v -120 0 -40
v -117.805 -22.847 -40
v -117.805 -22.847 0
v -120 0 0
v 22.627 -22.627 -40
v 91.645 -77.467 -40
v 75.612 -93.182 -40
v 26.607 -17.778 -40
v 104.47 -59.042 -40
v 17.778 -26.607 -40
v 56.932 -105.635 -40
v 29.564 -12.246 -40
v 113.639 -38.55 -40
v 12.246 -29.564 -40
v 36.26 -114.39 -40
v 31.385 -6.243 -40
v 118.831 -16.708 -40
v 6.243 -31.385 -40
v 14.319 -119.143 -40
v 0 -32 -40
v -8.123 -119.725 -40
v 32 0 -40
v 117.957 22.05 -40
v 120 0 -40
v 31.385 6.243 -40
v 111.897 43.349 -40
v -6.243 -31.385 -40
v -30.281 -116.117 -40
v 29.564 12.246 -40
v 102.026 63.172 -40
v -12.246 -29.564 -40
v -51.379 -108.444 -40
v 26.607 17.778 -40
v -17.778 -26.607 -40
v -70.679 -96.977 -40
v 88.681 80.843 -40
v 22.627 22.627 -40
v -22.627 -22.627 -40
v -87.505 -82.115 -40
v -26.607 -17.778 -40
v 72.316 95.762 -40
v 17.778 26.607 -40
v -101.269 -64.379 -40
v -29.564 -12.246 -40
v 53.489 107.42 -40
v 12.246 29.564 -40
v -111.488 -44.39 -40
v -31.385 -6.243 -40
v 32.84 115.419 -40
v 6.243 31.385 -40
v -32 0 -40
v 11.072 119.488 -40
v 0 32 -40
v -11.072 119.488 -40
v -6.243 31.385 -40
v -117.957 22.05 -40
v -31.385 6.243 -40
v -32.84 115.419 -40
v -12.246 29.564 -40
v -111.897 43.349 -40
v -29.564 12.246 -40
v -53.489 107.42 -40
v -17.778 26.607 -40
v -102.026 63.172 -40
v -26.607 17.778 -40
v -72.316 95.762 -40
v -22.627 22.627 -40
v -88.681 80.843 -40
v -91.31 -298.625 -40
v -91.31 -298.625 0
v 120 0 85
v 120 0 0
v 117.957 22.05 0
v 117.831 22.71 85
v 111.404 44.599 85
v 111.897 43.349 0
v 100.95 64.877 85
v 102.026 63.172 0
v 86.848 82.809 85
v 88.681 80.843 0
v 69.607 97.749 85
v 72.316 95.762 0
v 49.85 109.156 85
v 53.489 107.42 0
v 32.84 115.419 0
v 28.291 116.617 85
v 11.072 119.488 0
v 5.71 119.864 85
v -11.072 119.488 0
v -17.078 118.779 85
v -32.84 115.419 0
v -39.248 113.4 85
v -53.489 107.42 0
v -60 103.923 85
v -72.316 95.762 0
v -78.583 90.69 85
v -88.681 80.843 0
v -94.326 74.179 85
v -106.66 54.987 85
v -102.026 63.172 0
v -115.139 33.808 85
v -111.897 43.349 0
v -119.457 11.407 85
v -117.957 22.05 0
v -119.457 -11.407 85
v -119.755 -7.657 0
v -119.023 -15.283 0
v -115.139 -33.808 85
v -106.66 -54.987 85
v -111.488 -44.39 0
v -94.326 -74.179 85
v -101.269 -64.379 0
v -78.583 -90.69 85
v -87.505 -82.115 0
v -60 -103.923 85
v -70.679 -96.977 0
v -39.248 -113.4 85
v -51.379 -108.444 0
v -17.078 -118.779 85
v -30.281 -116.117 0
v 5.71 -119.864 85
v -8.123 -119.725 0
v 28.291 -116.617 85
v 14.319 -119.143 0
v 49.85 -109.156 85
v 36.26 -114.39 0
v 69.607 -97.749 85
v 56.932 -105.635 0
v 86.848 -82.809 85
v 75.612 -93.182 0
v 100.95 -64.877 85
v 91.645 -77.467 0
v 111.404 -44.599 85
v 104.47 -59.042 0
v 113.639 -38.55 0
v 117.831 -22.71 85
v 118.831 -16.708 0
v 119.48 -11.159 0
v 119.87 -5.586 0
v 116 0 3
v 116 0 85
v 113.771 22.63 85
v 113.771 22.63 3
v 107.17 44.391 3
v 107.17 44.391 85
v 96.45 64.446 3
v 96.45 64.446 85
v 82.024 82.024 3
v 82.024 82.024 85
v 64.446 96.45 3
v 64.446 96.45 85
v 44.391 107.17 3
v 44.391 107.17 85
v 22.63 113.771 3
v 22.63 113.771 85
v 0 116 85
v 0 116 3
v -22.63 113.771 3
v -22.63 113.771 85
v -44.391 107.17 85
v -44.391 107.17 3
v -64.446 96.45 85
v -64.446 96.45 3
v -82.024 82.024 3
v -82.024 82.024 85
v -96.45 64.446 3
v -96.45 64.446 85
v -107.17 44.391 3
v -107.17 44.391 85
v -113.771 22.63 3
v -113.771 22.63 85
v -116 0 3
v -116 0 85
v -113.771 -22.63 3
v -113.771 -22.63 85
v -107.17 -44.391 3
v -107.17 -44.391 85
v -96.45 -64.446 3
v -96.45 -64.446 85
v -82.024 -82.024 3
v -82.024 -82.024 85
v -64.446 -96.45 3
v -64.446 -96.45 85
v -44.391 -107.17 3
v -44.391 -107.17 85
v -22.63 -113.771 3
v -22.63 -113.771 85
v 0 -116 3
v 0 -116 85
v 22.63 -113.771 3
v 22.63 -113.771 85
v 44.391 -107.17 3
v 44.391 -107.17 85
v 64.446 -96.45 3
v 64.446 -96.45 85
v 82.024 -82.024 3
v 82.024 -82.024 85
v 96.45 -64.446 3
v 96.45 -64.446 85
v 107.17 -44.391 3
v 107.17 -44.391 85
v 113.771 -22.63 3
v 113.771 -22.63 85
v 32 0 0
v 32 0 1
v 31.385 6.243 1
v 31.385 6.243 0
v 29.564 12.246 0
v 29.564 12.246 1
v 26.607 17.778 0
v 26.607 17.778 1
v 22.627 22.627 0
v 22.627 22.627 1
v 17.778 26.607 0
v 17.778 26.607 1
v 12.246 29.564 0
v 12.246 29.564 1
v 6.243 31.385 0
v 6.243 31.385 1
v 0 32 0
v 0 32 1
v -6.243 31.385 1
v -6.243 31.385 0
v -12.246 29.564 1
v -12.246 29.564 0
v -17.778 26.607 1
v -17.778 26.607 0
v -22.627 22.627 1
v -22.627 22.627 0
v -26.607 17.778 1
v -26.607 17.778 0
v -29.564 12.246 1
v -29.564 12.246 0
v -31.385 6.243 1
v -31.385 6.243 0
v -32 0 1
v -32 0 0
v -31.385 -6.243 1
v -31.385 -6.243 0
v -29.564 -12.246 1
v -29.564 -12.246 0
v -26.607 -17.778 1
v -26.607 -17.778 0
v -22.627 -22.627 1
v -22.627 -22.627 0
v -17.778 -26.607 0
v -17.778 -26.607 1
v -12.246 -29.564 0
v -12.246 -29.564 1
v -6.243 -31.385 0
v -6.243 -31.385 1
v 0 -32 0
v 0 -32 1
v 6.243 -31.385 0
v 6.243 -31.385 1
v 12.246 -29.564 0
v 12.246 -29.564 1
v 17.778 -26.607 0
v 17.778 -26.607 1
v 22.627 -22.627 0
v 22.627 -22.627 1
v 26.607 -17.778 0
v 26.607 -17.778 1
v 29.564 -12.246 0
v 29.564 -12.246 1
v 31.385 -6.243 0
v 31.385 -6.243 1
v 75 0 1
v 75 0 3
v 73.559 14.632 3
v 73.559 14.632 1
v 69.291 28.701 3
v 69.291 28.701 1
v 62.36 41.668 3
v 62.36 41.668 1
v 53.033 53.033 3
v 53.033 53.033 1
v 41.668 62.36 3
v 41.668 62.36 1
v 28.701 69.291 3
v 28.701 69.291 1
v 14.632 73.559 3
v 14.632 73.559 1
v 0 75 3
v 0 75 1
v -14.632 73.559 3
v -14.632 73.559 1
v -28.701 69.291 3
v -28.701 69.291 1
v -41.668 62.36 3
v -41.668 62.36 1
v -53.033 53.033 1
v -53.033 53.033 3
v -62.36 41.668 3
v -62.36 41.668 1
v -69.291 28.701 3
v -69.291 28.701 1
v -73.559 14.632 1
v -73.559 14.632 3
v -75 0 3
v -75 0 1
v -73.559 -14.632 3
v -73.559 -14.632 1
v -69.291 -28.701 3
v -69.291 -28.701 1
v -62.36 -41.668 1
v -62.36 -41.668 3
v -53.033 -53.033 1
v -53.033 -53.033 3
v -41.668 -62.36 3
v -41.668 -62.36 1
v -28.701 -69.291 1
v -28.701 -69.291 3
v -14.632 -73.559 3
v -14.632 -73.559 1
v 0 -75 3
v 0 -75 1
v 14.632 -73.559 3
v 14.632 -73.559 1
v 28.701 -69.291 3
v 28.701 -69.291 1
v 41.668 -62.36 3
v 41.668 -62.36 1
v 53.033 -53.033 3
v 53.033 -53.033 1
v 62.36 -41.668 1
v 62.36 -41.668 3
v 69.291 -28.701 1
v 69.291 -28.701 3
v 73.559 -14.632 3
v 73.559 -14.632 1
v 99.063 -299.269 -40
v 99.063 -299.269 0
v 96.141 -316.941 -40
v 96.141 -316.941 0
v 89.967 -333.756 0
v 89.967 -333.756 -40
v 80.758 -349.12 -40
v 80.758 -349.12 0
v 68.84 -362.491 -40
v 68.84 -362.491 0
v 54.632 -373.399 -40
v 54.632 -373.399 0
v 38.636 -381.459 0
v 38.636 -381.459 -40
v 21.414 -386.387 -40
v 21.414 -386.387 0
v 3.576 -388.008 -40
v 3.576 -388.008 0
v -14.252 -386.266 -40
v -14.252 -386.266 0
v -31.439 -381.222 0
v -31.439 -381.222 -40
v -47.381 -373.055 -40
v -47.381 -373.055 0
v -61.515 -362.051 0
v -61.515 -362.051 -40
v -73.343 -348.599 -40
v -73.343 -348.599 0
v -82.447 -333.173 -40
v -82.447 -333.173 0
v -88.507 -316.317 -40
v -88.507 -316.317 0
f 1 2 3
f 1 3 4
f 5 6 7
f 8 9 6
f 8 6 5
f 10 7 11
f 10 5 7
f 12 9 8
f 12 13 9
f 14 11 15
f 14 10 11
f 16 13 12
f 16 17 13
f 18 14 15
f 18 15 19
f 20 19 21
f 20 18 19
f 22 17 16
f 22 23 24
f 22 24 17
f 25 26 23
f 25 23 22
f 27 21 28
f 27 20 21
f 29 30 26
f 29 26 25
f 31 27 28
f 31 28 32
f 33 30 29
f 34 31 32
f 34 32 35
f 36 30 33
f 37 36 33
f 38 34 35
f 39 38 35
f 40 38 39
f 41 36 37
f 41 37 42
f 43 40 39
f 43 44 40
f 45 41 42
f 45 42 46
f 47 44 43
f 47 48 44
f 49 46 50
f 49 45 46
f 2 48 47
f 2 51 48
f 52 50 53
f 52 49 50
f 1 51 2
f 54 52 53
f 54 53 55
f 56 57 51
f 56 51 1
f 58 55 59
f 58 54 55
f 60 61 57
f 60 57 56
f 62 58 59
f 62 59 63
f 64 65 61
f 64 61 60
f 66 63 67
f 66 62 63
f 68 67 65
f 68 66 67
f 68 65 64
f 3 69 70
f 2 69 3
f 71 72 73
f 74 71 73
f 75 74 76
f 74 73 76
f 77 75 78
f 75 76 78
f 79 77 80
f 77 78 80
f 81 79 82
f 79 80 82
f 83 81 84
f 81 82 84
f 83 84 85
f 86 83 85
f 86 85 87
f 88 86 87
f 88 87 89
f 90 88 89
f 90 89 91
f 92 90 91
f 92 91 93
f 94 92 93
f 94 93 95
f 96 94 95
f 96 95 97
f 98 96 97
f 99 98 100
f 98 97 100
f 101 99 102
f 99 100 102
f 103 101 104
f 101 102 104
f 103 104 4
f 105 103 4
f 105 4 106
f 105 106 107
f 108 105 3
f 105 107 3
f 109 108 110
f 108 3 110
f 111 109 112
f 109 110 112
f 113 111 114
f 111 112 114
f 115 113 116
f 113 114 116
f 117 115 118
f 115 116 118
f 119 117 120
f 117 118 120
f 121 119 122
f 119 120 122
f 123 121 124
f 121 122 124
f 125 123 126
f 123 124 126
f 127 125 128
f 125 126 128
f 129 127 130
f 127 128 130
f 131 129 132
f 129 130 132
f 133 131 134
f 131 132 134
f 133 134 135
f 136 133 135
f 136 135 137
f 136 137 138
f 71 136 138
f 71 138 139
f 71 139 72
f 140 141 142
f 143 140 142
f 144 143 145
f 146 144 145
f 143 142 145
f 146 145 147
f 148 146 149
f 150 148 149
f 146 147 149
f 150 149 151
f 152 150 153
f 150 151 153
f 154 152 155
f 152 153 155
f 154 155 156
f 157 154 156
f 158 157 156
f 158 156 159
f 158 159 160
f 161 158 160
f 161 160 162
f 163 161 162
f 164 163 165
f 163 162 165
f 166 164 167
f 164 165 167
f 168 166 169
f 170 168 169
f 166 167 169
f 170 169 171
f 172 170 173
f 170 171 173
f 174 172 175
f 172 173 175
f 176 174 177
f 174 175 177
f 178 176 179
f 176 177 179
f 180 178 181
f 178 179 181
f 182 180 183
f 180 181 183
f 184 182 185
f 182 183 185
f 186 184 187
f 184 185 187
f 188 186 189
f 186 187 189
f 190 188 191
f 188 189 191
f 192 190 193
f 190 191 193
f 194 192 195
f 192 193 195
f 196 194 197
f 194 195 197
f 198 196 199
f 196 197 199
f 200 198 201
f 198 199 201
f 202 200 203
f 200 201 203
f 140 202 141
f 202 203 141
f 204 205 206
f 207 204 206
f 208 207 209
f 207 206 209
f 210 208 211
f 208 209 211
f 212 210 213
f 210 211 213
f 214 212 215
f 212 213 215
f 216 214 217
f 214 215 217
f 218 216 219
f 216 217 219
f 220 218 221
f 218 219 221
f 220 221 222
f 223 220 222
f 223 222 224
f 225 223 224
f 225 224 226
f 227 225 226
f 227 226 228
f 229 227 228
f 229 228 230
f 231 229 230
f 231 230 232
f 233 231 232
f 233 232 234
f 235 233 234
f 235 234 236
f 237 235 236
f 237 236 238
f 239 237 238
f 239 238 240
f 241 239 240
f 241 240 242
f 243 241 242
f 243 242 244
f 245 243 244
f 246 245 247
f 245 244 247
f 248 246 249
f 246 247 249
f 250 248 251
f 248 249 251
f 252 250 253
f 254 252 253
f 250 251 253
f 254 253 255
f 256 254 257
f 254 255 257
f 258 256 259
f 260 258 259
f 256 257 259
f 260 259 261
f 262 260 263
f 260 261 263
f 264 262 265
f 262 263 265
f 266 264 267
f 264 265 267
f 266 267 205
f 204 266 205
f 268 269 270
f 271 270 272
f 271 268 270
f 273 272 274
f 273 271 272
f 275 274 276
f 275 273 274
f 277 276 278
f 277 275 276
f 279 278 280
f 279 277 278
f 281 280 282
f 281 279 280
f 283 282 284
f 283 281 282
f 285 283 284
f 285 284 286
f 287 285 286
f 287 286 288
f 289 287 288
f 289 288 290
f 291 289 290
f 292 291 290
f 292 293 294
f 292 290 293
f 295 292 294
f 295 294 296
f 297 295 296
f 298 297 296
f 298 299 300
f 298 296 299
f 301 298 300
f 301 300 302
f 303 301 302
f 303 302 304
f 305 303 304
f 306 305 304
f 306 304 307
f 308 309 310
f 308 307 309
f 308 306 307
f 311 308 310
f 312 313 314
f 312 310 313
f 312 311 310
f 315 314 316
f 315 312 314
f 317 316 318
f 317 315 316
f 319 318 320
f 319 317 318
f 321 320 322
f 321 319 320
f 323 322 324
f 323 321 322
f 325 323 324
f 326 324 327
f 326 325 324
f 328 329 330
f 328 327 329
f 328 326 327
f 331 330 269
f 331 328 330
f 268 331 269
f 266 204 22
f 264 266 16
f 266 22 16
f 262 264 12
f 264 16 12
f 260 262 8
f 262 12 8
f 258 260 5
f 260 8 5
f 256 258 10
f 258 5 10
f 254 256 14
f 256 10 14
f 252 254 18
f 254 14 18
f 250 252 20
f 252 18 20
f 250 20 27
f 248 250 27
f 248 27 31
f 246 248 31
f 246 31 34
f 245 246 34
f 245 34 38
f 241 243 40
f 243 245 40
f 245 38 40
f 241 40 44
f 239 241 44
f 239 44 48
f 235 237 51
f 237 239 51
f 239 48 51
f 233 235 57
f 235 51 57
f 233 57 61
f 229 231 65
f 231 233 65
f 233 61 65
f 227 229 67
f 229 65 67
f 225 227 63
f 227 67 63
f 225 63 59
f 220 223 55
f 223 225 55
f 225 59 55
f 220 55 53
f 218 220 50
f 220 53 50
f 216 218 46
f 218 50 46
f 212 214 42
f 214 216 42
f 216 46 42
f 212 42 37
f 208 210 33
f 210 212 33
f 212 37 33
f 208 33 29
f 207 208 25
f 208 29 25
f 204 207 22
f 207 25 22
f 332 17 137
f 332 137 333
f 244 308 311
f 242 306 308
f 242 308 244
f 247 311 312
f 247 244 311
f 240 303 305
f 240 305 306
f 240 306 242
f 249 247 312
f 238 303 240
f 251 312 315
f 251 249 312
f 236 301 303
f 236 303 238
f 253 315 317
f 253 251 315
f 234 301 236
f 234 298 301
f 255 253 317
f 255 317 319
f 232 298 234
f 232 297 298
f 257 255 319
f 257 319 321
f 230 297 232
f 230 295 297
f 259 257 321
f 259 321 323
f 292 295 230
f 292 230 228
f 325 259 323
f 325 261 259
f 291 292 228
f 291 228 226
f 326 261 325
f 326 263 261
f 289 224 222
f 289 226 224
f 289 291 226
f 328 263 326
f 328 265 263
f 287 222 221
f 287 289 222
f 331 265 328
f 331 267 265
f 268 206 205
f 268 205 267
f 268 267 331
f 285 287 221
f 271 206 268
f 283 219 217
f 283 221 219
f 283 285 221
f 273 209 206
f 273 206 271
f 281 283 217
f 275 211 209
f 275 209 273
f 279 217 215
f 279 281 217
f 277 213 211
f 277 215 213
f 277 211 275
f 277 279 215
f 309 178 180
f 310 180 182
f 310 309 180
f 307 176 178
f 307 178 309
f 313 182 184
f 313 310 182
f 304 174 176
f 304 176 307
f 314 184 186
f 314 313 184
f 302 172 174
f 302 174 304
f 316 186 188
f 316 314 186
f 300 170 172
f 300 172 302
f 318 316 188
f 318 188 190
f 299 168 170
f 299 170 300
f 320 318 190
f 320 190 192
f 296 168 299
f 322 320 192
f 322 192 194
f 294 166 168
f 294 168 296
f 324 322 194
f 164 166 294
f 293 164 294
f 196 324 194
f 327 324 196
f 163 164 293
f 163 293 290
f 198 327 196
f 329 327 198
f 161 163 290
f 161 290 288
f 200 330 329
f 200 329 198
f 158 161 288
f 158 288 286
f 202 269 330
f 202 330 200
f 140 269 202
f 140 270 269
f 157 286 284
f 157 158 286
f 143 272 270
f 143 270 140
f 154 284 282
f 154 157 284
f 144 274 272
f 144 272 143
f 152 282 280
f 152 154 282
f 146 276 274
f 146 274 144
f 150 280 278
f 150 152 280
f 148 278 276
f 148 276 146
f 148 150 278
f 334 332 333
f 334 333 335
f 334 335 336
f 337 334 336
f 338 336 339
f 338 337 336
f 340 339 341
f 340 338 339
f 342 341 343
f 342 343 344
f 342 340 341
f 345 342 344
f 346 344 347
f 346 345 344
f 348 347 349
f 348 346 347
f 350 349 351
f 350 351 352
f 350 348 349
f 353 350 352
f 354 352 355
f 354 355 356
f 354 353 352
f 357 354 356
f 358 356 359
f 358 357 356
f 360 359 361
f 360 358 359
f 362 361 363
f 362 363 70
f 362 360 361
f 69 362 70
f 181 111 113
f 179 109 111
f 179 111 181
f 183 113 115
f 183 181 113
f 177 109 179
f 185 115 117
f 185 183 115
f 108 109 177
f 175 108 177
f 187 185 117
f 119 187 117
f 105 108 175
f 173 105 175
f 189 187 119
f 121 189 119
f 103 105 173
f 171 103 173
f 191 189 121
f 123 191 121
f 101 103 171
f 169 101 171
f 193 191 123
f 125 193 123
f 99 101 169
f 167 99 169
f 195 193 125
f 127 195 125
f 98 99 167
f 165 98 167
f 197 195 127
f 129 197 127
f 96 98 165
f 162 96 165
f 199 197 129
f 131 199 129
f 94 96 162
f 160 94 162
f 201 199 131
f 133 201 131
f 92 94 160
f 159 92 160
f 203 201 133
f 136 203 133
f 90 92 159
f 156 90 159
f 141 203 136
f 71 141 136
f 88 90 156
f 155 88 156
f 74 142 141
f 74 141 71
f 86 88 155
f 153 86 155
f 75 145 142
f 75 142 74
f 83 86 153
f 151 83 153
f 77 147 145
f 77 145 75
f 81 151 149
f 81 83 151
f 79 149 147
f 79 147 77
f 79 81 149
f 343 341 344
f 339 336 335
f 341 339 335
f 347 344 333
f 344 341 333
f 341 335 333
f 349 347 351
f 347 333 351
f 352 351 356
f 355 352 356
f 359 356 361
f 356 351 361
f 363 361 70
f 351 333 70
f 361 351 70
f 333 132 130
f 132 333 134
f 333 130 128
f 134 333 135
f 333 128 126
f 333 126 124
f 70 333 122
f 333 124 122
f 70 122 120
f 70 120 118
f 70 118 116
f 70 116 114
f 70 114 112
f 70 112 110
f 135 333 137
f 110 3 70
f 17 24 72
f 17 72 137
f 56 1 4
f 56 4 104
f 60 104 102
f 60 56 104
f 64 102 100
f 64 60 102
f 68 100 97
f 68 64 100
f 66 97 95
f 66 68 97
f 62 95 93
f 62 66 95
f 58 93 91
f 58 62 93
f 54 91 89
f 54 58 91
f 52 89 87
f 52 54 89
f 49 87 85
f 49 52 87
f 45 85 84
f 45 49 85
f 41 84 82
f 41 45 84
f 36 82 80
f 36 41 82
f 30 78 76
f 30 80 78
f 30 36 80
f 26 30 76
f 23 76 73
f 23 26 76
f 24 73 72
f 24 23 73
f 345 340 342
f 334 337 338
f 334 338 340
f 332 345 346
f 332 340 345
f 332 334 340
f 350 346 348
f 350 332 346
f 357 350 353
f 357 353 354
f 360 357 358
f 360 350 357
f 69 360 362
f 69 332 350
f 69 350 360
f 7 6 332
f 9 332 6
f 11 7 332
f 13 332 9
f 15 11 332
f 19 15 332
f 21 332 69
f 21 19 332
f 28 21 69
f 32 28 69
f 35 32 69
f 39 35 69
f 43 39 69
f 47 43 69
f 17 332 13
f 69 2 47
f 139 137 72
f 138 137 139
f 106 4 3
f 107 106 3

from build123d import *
from build123d.topology import SkipClean

# Parameters (mm, degrees)
SKETCH2_R               = 120
BOSS_EXTRUDE2_DEPTH     = 85
SKETCH3_R               = 116
CUT_EXTRUDE1_DEPTH      = 82
CUT_EXTRUDE5_DEPTH      = 2
CUT_EXTRUDE5_DEPTH_BACK = 2
SKETCH8_R               = 75
SKETCH9_R               = 32
CUT_EXTRUDE6_DEPTH      = 5
BOSS_EXTRUDE4_START     = 40
SKETCH12_R              = 32
BOSS_EXTRUDE4_DEPTH     = 40


with BuildPart() as part:
    # Sketch2 → Boss-Extrude2 (new body)
    with BuildSketch(Plane.XY):
        Circle(SKETCH2_R)
    extrude(amount=BOSS_EXTRUDE2_DEPTH)

    # Sketch3 → Cut-Extrude1 (cut)
    with BuildSketch(Plane.XY.offset(85)):
        Circle(SKETCH3_R)
    extrude(amount=-CUT_EXTRUDE1_DEPTH, mode=Mode.SUBTRACT)

    # Sketch8 → Cut-Extrude5 (cut, two sides: drawn at the far end of the back side and taken through both)
    with BuildSketch(Plane.XY.offset(3).offset(-CUT_EXTRUDE5_DEPTH_BACK)):
        Circle(SKETCH8_R)
    extrude(amount=CUT_EXTRUDE5_DEPTH + CUT_EXTRUDE5_DEPTH_BACK, mode=Mode.SUBTRACT)

    # Sketch9 → Cut-Extrude6 (cut)
    with BuildSketch(Plane.XY.offset(1)):
        Circle(SKETCH9_R)
    extrude(amount=-CUT_EXTRUDE6_DEPTH, mode=Mode.SUBTRACT)

    # Sketch12 → Boss-Extrude4 (add)
    # profile 1 of 2: a face of its own
    with SkipClean():  # the faces are left unmerged after this step: merging them gives an invalid solid
        with BuildSketch(Plane(origin=(0, 0, 0), x_dir=(-1, 0, 0), z_dir=(0, 0, -1)).offset(BOSS_EXTRUDE4_START)):
            with BuildLine():
                ThreePointArc((120, 0), (0, 120), (-120, 0))
                Line((-120, 0), (-118.831087629, -16.70845932))
                ThreePointArc((-118.831087629, -16.70845932), (-3.111785776, -119.959646504), (117.805011812, -22.84686394))
                Line((117.805011812, -22.84686394), (120, 0))
            make_face()
            with Locations(Location((0, 0, 0), (0, 0, 180))):
                Circle(SKETCH12_R, mode=Mode.SUBTRACT)
        # profile 2 of 2: a face of its own
        with BuildSketch(Plane(origin=(0, 0, 0), x_dir=(-1, 0, 0), z_dir=(0, 0, -1)).offset(BOSS_EXTRUDE4_START)):
            with BuildLine():
                ThreePointArc((117.805011812, -22.84686394), (-3.111785776, -119.959646504), (-118.831087629, -16.70845932))
                Line((-118.831087629, -16.70845932), (-99.063378042, -299.268538041))
                ThreePointArc((-99.063378042, -299.268538041), (-3.575656086, -388.008129656), (91.309922092, -298.624981255))
                Line((91.309922092, -298.624981255), (117.805011812, -22.84686394))
            make_face()
        extrude(amount=-BOSS_EXTRUDE4_DEPTH)


solid = part.part
